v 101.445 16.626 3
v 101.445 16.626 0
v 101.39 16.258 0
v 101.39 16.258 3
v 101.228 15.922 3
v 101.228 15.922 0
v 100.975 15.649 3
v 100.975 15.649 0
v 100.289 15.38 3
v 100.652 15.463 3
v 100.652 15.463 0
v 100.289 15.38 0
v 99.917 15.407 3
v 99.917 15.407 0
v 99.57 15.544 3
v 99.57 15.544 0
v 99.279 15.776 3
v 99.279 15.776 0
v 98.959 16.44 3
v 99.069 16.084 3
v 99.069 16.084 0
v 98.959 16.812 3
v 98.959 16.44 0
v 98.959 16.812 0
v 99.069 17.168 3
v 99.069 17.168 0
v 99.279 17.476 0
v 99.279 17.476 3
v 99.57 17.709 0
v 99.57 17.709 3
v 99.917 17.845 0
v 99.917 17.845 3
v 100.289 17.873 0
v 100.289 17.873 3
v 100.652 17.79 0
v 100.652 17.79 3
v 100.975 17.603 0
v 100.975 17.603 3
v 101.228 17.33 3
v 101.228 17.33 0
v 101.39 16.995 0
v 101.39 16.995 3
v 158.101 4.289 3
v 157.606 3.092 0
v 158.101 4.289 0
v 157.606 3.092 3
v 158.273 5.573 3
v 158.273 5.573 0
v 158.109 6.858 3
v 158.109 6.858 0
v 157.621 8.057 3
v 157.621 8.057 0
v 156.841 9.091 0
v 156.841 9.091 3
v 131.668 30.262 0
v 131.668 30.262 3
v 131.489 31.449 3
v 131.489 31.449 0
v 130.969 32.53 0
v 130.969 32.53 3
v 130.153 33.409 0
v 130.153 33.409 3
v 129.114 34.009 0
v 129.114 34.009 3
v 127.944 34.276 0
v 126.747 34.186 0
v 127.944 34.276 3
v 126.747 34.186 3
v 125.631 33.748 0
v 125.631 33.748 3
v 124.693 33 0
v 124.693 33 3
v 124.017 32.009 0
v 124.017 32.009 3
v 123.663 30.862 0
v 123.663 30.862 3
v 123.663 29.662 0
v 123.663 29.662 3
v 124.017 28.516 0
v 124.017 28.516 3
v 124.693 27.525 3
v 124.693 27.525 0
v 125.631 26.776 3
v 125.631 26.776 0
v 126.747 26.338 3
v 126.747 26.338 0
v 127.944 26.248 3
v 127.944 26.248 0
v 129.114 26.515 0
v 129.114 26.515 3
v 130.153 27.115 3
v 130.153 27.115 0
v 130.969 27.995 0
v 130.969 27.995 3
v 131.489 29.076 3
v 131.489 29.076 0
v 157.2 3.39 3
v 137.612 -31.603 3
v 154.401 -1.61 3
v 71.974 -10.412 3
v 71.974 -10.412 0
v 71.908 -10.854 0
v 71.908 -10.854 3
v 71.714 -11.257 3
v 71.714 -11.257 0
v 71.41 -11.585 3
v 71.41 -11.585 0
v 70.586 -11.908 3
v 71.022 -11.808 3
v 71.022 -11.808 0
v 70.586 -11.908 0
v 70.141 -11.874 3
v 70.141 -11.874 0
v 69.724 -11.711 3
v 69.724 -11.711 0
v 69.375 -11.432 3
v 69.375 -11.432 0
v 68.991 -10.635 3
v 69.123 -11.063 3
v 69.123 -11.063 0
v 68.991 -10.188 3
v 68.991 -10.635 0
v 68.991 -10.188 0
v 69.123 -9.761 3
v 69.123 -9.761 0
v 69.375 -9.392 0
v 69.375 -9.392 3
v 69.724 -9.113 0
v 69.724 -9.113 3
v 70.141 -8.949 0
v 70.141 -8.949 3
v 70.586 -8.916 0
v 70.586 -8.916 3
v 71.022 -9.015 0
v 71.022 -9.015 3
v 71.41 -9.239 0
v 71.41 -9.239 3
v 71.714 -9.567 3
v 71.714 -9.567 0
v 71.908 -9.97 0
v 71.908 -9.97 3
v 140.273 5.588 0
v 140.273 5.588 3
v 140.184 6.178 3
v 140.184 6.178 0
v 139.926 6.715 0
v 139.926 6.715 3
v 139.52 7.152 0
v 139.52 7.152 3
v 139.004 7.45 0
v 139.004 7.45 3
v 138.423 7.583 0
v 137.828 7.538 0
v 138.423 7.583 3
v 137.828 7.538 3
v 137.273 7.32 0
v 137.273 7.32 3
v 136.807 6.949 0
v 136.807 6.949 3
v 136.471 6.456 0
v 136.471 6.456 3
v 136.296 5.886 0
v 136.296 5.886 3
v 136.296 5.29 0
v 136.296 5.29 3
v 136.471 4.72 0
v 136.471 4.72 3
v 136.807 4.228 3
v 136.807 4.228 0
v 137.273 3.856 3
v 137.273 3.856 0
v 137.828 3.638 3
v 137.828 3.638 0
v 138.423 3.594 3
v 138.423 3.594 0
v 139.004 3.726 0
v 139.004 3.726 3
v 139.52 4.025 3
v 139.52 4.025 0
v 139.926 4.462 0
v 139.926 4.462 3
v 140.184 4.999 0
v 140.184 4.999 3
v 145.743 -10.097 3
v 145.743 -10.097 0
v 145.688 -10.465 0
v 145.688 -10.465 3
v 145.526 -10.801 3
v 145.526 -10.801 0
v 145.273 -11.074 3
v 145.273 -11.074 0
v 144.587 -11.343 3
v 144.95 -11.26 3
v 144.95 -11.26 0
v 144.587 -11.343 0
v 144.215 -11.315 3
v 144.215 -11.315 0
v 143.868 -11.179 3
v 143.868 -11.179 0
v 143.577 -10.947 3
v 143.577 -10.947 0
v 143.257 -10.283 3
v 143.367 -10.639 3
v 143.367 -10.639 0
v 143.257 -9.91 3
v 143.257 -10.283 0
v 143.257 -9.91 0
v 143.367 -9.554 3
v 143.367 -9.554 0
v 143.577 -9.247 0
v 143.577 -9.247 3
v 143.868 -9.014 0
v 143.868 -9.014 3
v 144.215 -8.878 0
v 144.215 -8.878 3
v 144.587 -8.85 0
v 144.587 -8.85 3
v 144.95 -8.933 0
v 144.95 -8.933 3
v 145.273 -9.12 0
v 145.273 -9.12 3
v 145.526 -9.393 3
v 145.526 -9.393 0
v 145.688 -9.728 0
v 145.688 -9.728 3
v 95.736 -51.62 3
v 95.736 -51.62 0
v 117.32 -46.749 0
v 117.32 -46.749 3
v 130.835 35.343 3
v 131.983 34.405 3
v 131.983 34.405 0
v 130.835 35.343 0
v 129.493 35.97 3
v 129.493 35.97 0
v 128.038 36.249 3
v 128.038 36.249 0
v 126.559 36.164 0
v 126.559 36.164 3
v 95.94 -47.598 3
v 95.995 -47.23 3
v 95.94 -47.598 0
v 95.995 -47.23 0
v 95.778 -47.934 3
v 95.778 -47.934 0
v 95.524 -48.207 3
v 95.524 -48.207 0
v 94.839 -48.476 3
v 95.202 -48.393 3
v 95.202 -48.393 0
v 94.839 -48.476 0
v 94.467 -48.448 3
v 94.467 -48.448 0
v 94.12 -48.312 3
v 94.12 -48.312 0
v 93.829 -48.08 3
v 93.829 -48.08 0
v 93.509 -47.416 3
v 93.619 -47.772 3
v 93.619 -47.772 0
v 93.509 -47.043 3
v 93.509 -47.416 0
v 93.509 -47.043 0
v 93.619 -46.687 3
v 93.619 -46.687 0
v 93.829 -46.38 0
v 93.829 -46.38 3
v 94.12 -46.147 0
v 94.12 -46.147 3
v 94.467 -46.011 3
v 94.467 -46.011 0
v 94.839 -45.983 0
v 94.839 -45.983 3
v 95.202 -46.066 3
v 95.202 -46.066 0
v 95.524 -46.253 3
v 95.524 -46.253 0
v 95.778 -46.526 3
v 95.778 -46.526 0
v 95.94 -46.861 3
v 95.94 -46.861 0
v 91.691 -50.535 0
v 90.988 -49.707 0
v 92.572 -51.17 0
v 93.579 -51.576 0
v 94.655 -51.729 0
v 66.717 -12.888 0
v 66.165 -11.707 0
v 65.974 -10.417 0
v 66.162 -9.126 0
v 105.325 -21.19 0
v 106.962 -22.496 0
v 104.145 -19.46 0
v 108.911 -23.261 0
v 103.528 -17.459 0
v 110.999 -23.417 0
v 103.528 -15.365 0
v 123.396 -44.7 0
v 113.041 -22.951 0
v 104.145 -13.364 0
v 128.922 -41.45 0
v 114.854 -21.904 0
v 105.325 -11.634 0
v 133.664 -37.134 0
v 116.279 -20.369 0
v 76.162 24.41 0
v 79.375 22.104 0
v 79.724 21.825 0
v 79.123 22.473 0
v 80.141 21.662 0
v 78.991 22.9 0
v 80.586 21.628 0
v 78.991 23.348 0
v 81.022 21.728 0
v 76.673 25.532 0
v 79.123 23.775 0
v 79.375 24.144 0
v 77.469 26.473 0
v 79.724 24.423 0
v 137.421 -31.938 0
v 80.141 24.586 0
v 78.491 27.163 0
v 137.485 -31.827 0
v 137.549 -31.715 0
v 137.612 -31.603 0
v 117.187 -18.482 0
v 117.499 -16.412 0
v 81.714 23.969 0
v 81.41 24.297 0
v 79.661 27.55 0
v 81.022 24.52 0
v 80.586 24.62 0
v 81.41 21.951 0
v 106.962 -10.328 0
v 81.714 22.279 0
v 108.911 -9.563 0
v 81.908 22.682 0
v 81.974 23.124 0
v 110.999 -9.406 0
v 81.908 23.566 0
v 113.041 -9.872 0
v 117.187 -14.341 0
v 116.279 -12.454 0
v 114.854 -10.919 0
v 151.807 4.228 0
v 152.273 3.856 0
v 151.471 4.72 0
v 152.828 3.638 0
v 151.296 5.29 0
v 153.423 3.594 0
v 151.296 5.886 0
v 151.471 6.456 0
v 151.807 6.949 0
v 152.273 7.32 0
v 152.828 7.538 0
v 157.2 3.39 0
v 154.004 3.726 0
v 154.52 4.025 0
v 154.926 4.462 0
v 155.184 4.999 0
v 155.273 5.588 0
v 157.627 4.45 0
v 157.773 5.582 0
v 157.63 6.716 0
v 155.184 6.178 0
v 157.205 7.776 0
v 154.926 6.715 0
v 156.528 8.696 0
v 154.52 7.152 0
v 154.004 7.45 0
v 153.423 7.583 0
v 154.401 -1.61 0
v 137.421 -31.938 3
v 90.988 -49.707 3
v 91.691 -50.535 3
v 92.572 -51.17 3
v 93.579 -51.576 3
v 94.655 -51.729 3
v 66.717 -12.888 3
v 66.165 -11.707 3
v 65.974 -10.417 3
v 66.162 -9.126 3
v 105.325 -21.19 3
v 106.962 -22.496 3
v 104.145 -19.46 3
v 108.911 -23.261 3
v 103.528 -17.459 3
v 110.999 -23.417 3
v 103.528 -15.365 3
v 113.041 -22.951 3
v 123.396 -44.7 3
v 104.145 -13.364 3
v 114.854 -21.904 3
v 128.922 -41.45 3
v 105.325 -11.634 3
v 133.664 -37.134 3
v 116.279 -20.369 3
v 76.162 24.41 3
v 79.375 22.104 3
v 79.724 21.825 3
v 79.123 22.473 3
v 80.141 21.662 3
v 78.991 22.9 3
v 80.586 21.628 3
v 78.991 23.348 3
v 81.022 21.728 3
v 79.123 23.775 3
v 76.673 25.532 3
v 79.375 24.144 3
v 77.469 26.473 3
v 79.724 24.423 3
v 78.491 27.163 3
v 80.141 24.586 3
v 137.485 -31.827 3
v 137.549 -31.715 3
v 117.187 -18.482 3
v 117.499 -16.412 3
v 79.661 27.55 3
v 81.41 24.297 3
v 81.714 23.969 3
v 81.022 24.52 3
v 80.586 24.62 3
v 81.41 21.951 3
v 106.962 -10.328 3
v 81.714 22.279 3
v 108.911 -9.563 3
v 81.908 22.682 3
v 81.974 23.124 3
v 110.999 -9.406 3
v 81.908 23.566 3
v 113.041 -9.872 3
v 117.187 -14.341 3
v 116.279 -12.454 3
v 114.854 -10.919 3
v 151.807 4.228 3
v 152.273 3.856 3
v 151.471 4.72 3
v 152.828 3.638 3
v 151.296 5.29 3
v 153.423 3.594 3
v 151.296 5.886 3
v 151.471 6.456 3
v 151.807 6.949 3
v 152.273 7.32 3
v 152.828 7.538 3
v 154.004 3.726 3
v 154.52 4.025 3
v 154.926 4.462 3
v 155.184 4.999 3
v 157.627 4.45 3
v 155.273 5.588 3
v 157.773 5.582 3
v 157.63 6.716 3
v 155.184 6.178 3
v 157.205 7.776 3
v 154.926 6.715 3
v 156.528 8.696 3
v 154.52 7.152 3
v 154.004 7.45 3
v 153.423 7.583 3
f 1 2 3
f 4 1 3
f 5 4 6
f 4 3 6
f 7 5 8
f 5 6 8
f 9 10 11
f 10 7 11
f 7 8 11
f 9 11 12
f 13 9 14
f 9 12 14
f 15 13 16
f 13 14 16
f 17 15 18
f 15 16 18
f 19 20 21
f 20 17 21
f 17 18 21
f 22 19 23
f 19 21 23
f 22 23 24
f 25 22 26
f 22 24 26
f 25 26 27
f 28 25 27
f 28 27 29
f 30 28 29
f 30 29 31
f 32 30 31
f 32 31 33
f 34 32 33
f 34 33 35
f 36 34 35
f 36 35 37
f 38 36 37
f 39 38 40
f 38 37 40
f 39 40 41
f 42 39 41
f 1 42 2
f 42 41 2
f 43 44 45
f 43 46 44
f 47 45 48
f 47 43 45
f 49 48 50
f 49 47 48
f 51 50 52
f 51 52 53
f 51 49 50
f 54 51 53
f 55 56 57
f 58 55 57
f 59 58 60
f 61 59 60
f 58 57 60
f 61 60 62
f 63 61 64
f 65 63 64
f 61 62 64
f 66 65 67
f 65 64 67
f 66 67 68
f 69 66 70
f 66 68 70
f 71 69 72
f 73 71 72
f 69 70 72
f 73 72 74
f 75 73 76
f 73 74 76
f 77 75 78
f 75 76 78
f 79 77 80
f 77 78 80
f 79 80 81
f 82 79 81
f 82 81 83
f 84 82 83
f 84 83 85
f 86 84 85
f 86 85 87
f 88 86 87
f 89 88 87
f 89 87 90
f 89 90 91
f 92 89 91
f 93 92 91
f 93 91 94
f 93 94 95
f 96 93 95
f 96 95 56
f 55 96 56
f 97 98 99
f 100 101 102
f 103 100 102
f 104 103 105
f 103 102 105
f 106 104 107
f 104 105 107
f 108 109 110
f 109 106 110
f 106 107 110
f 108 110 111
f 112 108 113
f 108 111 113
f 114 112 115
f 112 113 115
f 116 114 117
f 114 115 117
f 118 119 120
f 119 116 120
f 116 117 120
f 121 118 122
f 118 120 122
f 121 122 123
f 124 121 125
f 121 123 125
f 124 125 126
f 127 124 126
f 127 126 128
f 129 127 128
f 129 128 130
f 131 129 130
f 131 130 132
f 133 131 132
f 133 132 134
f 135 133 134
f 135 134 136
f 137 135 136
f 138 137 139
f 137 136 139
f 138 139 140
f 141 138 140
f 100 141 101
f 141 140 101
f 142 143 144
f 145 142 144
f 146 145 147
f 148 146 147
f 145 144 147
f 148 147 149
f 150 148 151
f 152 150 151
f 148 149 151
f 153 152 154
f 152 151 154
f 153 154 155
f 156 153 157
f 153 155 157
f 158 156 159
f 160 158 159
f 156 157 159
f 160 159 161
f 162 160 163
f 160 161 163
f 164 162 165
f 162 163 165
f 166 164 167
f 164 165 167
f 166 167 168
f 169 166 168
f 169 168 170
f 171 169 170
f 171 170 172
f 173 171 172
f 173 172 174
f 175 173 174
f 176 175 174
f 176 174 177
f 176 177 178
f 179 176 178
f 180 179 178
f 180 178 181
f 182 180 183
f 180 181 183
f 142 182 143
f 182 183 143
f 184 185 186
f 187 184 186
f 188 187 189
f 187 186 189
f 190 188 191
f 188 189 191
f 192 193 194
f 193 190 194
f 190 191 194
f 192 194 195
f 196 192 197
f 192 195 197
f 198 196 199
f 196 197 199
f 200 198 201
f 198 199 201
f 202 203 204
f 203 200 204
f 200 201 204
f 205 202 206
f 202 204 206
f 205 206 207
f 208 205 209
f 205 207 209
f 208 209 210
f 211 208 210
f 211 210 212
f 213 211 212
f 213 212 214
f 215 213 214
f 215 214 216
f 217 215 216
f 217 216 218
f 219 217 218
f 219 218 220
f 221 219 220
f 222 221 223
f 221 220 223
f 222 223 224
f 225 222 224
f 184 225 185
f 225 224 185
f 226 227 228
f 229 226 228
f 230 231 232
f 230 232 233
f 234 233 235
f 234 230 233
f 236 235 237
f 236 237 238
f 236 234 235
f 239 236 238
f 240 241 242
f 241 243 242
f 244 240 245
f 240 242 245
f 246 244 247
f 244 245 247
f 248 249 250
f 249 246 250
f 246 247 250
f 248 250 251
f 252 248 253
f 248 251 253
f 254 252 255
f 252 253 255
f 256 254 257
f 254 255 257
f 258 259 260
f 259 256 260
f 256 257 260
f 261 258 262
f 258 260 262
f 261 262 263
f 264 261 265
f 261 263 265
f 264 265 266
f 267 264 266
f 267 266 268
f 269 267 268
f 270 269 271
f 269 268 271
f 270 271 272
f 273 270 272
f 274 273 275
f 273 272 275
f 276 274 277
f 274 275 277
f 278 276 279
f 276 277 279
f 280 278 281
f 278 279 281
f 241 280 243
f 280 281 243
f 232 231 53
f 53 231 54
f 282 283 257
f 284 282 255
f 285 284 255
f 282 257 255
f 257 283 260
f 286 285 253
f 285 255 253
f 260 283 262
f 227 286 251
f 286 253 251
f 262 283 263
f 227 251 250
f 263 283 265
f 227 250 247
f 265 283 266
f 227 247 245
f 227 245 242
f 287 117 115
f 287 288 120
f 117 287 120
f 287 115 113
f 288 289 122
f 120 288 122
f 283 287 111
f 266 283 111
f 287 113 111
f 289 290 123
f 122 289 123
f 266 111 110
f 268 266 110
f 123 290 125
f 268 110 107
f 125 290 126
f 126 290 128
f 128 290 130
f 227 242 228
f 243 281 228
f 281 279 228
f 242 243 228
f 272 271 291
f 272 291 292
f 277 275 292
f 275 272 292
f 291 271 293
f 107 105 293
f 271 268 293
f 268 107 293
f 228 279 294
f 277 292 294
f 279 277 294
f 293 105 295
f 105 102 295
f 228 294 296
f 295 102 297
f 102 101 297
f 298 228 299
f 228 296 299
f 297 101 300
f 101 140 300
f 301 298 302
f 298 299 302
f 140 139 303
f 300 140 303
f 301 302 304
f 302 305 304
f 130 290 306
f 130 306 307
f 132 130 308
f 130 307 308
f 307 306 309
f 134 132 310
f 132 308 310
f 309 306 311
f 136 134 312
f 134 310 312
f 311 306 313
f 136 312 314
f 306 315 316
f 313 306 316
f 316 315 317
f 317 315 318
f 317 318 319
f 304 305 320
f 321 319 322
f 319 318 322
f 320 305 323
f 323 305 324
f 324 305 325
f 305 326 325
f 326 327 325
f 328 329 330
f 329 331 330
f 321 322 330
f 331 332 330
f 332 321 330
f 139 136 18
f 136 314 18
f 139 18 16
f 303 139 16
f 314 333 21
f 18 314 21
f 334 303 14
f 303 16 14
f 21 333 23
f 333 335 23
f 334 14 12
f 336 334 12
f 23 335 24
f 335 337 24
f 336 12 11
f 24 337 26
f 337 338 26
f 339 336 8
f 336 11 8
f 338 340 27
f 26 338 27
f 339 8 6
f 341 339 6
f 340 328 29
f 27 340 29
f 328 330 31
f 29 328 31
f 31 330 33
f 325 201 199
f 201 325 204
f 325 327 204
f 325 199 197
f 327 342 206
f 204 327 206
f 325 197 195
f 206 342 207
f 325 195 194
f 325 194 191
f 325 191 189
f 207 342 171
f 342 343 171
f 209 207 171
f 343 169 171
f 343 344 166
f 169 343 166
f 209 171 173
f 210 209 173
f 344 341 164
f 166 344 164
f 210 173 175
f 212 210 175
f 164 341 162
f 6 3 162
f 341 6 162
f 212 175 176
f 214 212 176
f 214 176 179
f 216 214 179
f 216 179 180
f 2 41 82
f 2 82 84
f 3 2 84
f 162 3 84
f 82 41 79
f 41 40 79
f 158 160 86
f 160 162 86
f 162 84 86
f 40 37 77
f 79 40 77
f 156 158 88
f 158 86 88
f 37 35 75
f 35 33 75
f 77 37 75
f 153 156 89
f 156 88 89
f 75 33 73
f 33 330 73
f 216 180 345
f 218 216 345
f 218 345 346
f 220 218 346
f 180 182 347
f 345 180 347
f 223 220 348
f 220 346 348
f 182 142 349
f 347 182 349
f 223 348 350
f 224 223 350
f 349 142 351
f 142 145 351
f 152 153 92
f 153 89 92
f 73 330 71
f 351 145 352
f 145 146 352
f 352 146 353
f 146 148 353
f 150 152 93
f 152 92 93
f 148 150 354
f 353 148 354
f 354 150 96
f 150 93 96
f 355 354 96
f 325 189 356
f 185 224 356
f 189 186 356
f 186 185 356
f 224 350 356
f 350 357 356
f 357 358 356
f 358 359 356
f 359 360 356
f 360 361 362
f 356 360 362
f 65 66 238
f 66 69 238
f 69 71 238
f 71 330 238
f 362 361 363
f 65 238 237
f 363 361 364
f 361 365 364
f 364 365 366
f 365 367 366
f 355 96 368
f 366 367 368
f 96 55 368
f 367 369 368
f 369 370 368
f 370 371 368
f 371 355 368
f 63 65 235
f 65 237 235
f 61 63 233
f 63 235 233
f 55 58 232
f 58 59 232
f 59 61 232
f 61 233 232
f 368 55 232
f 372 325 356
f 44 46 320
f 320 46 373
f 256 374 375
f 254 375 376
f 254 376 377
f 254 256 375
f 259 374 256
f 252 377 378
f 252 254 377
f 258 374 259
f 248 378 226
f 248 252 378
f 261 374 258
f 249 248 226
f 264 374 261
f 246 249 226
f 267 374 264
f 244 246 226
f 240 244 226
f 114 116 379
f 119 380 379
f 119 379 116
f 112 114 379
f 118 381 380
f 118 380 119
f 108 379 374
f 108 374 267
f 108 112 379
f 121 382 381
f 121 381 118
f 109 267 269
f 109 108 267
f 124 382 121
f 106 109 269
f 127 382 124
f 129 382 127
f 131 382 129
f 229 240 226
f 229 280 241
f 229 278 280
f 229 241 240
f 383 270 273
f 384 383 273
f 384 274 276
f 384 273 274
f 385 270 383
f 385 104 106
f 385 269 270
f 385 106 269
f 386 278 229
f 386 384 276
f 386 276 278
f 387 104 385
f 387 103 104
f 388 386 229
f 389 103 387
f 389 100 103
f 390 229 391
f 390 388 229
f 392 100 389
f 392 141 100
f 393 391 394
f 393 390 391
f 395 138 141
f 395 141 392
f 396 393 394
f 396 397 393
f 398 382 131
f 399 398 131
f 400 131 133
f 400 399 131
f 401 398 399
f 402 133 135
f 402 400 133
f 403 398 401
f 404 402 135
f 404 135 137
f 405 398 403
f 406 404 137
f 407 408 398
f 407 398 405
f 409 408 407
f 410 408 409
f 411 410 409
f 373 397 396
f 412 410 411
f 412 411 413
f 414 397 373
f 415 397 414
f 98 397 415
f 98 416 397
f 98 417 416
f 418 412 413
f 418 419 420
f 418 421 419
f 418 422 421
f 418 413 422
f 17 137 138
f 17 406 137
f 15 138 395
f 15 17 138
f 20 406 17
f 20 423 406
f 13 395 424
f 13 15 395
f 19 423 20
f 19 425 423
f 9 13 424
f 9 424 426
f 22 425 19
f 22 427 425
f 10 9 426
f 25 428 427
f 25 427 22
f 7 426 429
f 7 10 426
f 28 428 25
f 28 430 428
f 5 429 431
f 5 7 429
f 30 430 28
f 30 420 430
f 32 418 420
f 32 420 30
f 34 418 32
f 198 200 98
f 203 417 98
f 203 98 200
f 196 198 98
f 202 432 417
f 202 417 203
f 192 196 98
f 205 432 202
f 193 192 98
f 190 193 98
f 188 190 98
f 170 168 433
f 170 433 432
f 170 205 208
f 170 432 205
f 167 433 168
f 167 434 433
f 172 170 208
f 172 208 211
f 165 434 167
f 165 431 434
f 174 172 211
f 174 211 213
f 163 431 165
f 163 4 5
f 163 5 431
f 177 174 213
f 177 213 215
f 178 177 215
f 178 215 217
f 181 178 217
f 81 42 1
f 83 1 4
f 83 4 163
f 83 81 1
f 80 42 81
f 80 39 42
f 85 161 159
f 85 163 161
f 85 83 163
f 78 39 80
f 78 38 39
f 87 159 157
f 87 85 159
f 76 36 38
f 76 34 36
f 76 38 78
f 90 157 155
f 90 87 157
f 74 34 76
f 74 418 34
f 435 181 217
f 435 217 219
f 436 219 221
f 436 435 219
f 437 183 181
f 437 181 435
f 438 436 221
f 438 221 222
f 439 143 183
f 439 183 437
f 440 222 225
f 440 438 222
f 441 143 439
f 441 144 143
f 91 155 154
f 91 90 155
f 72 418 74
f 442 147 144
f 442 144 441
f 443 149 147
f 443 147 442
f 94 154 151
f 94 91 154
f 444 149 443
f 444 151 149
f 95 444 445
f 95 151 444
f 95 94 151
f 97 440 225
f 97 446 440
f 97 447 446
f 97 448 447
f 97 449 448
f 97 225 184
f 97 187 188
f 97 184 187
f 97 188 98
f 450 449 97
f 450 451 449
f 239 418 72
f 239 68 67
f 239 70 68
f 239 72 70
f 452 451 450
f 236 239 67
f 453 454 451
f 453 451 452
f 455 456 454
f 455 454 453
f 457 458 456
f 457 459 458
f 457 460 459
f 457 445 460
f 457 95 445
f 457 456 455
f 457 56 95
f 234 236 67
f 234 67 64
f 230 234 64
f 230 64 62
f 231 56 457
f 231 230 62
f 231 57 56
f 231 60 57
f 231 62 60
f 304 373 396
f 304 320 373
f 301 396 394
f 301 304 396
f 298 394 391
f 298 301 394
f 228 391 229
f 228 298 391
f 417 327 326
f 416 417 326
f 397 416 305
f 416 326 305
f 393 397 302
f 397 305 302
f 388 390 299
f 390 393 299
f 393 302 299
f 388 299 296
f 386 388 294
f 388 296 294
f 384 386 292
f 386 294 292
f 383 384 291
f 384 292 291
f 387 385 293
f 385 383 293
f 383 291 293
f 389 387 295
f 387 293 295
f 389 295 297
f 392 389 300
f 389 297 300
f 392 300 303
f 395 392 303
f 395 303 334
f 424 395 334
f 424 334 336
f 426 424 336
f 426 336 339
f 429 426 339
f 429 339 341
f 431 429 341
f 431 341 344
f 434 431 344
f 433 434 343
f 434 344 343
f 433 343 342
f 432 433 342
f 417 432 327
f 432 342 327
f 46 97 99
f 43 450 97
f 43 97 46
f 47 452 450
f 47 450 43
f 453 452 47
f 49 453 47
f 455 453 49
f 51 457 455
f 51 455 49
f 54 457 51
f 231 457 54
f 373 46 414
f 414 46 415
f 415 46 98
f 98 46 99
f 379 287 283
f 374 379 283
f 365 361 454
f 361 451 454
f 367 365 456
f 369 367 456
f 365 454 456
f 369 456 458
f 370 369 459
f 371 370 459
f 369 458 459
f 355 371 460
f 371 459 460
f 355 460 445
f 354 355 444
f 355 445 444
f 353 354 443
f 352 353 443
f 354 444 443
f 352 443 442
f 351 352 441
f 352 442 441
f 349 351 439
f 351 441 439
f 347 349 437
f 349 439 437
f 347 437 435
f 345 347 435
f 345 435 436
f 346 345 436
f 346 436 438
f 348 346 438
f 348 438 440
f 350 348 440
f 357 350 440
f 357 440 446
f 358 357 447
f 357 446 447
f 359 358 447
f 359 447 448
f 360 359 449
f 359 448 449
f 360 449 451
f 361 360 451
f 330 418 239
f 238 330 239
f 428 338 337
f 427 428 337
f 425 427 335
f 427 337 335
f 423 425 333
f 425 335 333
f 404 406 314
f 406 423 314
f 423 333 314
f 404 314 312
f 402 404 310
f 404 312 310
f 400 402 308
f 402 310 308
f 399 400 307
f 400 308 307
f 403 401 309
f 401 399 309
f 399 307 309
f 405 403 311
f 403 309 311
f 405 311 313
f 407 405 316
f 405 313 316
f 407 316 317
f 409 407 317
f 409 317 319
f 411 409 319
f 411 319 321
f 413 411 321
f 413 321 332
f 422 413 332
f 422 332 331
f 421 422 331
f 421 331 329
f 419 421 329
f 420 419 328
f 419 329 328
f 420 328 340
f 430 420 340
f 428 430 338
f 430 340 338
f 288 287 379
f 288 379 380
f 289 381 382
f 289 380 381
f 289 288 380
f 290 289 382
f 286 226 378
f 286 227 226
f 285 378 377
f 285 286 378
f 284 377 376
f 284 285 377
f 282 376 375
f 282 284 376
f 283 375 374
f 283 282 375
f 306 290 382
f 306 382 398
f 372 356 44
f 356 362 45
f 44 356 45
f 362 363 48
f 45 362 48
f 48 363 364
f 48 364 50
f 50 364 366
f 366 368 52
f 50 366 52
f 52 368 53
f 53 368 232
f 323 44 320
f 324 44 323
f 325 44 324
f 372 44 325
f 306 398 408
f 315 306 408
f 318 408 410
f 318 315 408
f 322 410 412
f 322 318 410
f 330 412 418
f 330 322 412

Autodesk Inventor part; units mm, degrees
ref_plane "YZ Plane" through (0, 0, 0) normal (1, 0, 0) x (0, 1, 0)
ref_plane "XZ Plane" through (0, 0, 0) normal (0, 1, 0) x (-1, 0, 0)
ref_plane "XY Plane" through (0, 0, 0) normal (0, 0, 1) x (1, 0, 0)
sketch "スケッチ3" plane through (0, 0, 0) normal (0, 0, 1) x (1, 0, 0)
  circle A0 centre (110.4743, -16.4118) radius 30.1 construction
  circle A1 centre (150.4743, 0.5882) radius 1.5
  circle A2 centre (127.6431, 30.2622) radius 1.5
  circle A3 centre (80.4743, 23.124) radius 1.5
  circle A4 centre (70.4743, -10.4118) radius 1.5
  circle A5 centre (110.4743, -16.4118) radius 7.025
  arc A6 (79.801, 27.5733) -> (76.162, 24.4099) centre (80.4743, 23.124) ccw
  arc A7 (131.2097, 33.0062) -> (126.9698, 34.7115) centre (127.6431, 30.2622) ccw
  arc A8 (154.401, -1.6098) -> (154.0408, 3.3323) centre (150.4743, 0.5882) ccw
  arc A9 (66.162, -9.1259) -> (66.7172, -12.8885) centre (70.4743, -10.4118) ccw
  arc A10 (117.3199, -46.749) -> (137.6119, -31.6026) centre (110.4743, -16.4118) ccw
  line L0 (154.401, -1.6098) -> (137.6119, -31.6026)
  line L1 (66.162, -9.1259) -> (76.162, 24.4099)
  line L2 (79.801, 27.5733) -> (126.9698, 34.7115)
  line L3 (131.2097, 33.0062) -> (154.0408, 3.3323)
  line L4 (96.5433, 16.3458) -> (118.2214, -10.0492) construction
  line L5 (117.0311, -23.9953) -> (91.1935, -46.3348) construction
  circle A11 centre (100.1953, 16.6261) radius 3 construction
  circle A12 centre (144.4932, -10.0968) radius 3 construction
  circle A13 centre (100.1953, 16.6261) radius 4.5 construction
  circle A14 centre (144.4932, -10.0968) radius 4.5 construction
  arc A15 (90.988, -49.7066) -> (95.7356, -51.6195) centre (94.7451, -47.2298) ccw
  circle A16 centre (94.7451, -47.2298) radius 3 construction
  line L6 (95.7356, -51.6195) -> (117.3199, -46.749)
  line L7 (66.7172, -12.8885) -> (90.988, -49.7066)
  circle A17 centre (100.1953, 16.6261) radius 1.25
  circle A18 centre (144.4932, -10.0968) radius 1.25
  circle A19 centre (94.7451, -47.2298) radius 1.25
  circle A20 centre (110.4743, -16.4118) radius 30.1 construction
  circle A21 centre (150.4743, 0.5882) radius 1.5
  circle A22 centre (127.6431, 30.2622) radius 1.5
  circle A23 centre (80.4743, 23.124) radius 1.5
  circle A24 centre (70.4743, -10.4118) radius 1.5
  circle A25 centre (110.4743, -16.4118) radius 7.025
  arc A26 (79.801, 27.5733) -> (76.162, 24.4099) centre (80.4743, 23.124) ccw
  arc A27 (131.2097, 33.0062) -> (126.9698, 34.7115) centre (127.6431, 30.2622) ccw
  arc A28 (154.401, -1.6098) -> (154.0408, 3.3323) centre (150.4743, 0.5882) ccw
  arc A29 (66.162, -9.1259) -> (66.7172, -12.8885) centre (70.4743, -10.4118) ccw
  arc A30 (117.3199, -46.749) -> (137.6119, -31.6026) centre (110.4743, -16.4118) ccw
  line L8 (154.401, -1.6098) -> (137.6119, -31.6026)
  line L9 (66.162, -9.1259) -> (76.162, 24.4099)
  line L10 (79.801, 27.5733) -> (126.9698, 34.7115)
  line L11 (131.2097, 33.0062) -> (154.0408, 3.3323)
  line L12 (96.5433, 16.3458) -> (118.2214, -10.0492) construction
  line L13 (117.0311, -23.9953) -> (91.1935, -46.3348) construction
  circle A31 centre (100.1953, 16.6261) radius 3 construction
  circle A32 centre (144.4932, -10.0968) radius 3 construction
  circle A33 centre (100.1953, 16.6261) radius 4.5 construction
  circle A34 centre (144.4932, -10.0968) radius 4.5 construction
  arc A35 (90.988, -49.7066) -> (95.7356, -51.6195) centre (94.7451, -47.2298) ccw
  circle A36 centre (94.7451, -47.2298) radius 3 construction
  line L14 (95.7356, -51.6195) -> (117.3199, -46.749)
  line L15 (66.7172, -12.8885) -> (90.988, -49.7066)
  circle A37 centre (100.1953, 16.6261) radius 1.25
  circle A38 centre (144.4932, -10.0968) radius 1.25
  circle A39 centre (94.7451, -47.2298) radius 1.25
  circle A40 centre (153.2732, 5.5882) radius 1.5
  circle A41 centre (138.2732, 5.5882) radius 1.5
  arc A42 (157.1998, 3.3902) -> (156.3941, 8.8301) centre (153.2732, 5.5882) ccw
  line L16 (154.401, -1.6098) -> (157.1998, 3.3902)
  line L17 (130.7641, 33.504) -> (156.3941, 8.8301)
  circle A43 centre (138.2732, 5.5882) radius 3
  circle A44 centre (153.2732, 5.5882) radius 3
  point P0 (0, 0)
  point P1 (0, 0)
  point P2 (0, 0)
  dimension "d20" = 14.05
  dimension "d21" = 9
  dimension "d22" = 9
  dimension "d23" = 9
  dimension "d24" = 9
  dimension "d25" = 1
  dimension "d26" = 6
  dimension "d27" = 6
  dimension "d28" = 9
  dimension "d29" = 9
  dimension "d30" = 9
  dimension "d31" = 6
  dimension "d32" = 2.5
  dimension "d33" = 2.5
  dimension "d34" = 2.5
  dimension "d37" = 14.05
  dimension "d38" = 9
  dimension "d39" = 9
  dimension "d40" = 9
  dimension "d41" = 9
  dimension "d42" = 1
  dimension "d43" = 6
  dimension "d44" = 6
  dimension "d45" = 9
  dimension "d46" = 9
  dimension "d47" = 9
  dimension "d48" = 6
  dimension "d49" = 2.5
  dimension "d50" = 2.5
  dimension "d51" = 2.5
  dimension "d52" = 3
  dimension "d53" = 3
  dimension "d54" = 15
  dimension "d55" = 9
  dimension "d56" = 6
  dimension "d57" = 6
  dimension "d58" = 5
extrude "押し出し3" add sketch "スケッチ3" along normal blind 3 contours A1 | L2 A7 L3 A44 A8 L0 A10 L6 A15 L7 A9 L1 A6 | L17 A42 L16 A8 A44 L3 A7 | A44 A8 L3 A40 | L3 A40 A8 A44 | A40 L3 | L3 A40 | A43
extrude "押し出し4" cut sketch "スケッチ3" along normal blind 10 contours A40 L3 | L3 A40
sketch "スケッチ4" plane through (0, 0, 3) normal (0, 0, 1) x (1, 0, 0)
  circle A0 centre (153.2732, 5.5882) radius 1.5 projected
  circle A1 centre (138.2732, 5.5882) radius 1.5 projected
  circle A2 centre (110.4743, -16.4118) radius 7.025 projected
  circle A3 centre (70.4743, -10.4118) radius 1.5 projected
  circle A4 centre (80.4743, 23.124) radius 1.5 projected
  circle A5 centre (127.6431, 30.2622) radius 1.5 projected
  circle A6 centre (94.7451, -47.2298) radius 1.25 projected
  circle A7 centre (144.4932, -10.0968) radius 1.25 projected
  circle A8 centre (100.1953, 16.6261) radius 1.25 projected
  arc A9 (79.801, 27.5733) -> (76.162, 24.4099) centre (80.4743, 23.124) ccw projected
  line L0 (76.162, 24.4099) -> (66.162, -9.1259) projected
  arc A10 (66.162, -9.1259) -> (66.7172, -12.8885) centre (70.4743, -10.4118) ccw projected
  line L1 (66.7172, -12.8885) -> (90.988, -49.7066) projected
  arc A11 (90.988, -49.7066) -> (95.7356, -51.6195) centre (94.7451, -47.2298) ccw projected
  line L2 (95.7356, -51.6195) -> (117.3199, -46.749) projected
  arc A12 (117.3199, -46.749) -> (137.6119, -31.6026) centre (110.4743, -16.4118) ccw projected
  line L3 (137.6119, -31.6026) -> (157.1998, 3.3902) projected
  arc A13 (157.1998, 3.3902) -> (156.3941, 8.8301) centre (153.2732, 5.5882) ccw projected
  line L4 (156.3941, 8.8301) -> (130.7641, 33.504) projected
  arc A14 (130.7641, 33.504) -> (126.9698, 34.7115) centre (127.6431, 30.2622) ccw projected
  line L5 (126.9698, 34.7115) -> (79.801, 27.5733) projected
  circle A15 centre (127.6431, 30.2622) radius 4.025
  arc A16 (131.983, 34.4054) -> (126.5593, 36.1635) centre (127.6431, 30.2622) ccw
  line L6 (79.6614, 27.5499) -> (126.5593, 36.1635)
  line L7 (131.983, 34.4054) -> (156.528, 8.6956)
  point P0 (0, 0)
  dimension "d61" = 8.05
  dimension "d62" = 12
extrude "押し出し5" add sketch "スケッチ4" against normal blind 3 contours A9 L6 A16 L7 A13 L4 A14 L5
extrude "押し出し6" cut sketch "スケッチ4" against normal blind 3 contours A15
sketch "スケッチ5" plane through (0, 0, 3) normal (0, 0, 1) x (1, 0, 0)
  circle A0 centre (127.6431, 30.2622) radius 4.025 projected
  circle A1 centre (153.2732, 5.5882) radius 1.5 projected
  circle A2 centre (138.2732, 5.5882) radius 1.5 projected
  circle A3 centre (110.4743, -16.4118) radius 7.025 projected
  circle A4 centre (70.4743, -10.4118) radius 1.5 projected
  circle A5 centre (80.4743, 23.124) radius 1.5 projected
  circle A6 centre (94.7451, -47.2298) radius 1.25 projected
  circle A7 centre (144.4932, -10.0968) radius 1.25 projected
  circle A8 centre (100.1953, 16.6261) radius 1.25 projected
  arc A9 (79.6614, 27.5499) -> (76.162, 24.4099) centre (80.4743, 23.124) ccw projected
  line L0 (76.162, 24.4099) -> (66.162, -9.1259) projected
  arc A10 (66.162, -9.1259) -> (66.7172, -12.8885) centre (70.4743, -10.4118) ccw projected
  line L1 (66.7172, -12.8885) -> (90.988, -49.7066) projected
  arc A11 (90.988, -49.7066) -> (95.7356, -51.6195) centre (94.7451, -47.2298) ccw projected
  line L2 (95.7356, -51.6195) -> (117.3199, -46.749) projected
  arc A12 (117.3199, -46.749) -> (137.6119, -31.6026) centre (110.4743, -16.4118) ccw projected
  line L3 (137.6119, -31.6026) -> (157.1998, 3.3902) projected
  arc A13 (157.1998, 3.3902) -> (156.528, 8.6956) centre (153.2732, 5.5882) ccw projected
  line L4 (156.528, 8.6956) -> (131.983, 34.4054) projected
  arc A14 (131.983, 34.4054) -> (126.5593, 36.1635) centre (127.6431, 30.2622) ccw projected
  line L5 (126.5593, 36.1635) -> (79.6614, 27.5499) projected
  circle A15 centre (153.2732, 5.5882) radius 2
  circle A16 centre (138.2732, 5.5882) radius 2
  arc A17 (157.6055, 3.092) -> (156.8408, 9.0914) centre (153.2732, 5.5882) ccw
  line L6 (131.9243, 34.466) -> (156.8408, 9.0914)
  line L7 (157.6055, 3.092) -> (137.4212, -31.9384)
  arc A18 (117.3199, -46.749) -> (137.6119, -31.6026) centre (110.4743, -16.4118) ccw projected
  arc A19 (131.983, 34.4054) -> (126.5593, 36.1635) centre (127.6431, 30.2622) ccw projected
  point P0 (0, 0)
  dimension "d67" = 4
  dimension "d68" = 4
  dimension "d69" = 3
extrude "押し出し7" add sketch "スケッチ5" against normal blind 3 contours L6 A17 L7 A12 L3 A13 L4
extrude "押し出し8" cut sketch "スケッチ5" against normal blind 3 contours A15 | A16
properties part number "前足内フレーム" material "アルミニウム 2014-T4"
